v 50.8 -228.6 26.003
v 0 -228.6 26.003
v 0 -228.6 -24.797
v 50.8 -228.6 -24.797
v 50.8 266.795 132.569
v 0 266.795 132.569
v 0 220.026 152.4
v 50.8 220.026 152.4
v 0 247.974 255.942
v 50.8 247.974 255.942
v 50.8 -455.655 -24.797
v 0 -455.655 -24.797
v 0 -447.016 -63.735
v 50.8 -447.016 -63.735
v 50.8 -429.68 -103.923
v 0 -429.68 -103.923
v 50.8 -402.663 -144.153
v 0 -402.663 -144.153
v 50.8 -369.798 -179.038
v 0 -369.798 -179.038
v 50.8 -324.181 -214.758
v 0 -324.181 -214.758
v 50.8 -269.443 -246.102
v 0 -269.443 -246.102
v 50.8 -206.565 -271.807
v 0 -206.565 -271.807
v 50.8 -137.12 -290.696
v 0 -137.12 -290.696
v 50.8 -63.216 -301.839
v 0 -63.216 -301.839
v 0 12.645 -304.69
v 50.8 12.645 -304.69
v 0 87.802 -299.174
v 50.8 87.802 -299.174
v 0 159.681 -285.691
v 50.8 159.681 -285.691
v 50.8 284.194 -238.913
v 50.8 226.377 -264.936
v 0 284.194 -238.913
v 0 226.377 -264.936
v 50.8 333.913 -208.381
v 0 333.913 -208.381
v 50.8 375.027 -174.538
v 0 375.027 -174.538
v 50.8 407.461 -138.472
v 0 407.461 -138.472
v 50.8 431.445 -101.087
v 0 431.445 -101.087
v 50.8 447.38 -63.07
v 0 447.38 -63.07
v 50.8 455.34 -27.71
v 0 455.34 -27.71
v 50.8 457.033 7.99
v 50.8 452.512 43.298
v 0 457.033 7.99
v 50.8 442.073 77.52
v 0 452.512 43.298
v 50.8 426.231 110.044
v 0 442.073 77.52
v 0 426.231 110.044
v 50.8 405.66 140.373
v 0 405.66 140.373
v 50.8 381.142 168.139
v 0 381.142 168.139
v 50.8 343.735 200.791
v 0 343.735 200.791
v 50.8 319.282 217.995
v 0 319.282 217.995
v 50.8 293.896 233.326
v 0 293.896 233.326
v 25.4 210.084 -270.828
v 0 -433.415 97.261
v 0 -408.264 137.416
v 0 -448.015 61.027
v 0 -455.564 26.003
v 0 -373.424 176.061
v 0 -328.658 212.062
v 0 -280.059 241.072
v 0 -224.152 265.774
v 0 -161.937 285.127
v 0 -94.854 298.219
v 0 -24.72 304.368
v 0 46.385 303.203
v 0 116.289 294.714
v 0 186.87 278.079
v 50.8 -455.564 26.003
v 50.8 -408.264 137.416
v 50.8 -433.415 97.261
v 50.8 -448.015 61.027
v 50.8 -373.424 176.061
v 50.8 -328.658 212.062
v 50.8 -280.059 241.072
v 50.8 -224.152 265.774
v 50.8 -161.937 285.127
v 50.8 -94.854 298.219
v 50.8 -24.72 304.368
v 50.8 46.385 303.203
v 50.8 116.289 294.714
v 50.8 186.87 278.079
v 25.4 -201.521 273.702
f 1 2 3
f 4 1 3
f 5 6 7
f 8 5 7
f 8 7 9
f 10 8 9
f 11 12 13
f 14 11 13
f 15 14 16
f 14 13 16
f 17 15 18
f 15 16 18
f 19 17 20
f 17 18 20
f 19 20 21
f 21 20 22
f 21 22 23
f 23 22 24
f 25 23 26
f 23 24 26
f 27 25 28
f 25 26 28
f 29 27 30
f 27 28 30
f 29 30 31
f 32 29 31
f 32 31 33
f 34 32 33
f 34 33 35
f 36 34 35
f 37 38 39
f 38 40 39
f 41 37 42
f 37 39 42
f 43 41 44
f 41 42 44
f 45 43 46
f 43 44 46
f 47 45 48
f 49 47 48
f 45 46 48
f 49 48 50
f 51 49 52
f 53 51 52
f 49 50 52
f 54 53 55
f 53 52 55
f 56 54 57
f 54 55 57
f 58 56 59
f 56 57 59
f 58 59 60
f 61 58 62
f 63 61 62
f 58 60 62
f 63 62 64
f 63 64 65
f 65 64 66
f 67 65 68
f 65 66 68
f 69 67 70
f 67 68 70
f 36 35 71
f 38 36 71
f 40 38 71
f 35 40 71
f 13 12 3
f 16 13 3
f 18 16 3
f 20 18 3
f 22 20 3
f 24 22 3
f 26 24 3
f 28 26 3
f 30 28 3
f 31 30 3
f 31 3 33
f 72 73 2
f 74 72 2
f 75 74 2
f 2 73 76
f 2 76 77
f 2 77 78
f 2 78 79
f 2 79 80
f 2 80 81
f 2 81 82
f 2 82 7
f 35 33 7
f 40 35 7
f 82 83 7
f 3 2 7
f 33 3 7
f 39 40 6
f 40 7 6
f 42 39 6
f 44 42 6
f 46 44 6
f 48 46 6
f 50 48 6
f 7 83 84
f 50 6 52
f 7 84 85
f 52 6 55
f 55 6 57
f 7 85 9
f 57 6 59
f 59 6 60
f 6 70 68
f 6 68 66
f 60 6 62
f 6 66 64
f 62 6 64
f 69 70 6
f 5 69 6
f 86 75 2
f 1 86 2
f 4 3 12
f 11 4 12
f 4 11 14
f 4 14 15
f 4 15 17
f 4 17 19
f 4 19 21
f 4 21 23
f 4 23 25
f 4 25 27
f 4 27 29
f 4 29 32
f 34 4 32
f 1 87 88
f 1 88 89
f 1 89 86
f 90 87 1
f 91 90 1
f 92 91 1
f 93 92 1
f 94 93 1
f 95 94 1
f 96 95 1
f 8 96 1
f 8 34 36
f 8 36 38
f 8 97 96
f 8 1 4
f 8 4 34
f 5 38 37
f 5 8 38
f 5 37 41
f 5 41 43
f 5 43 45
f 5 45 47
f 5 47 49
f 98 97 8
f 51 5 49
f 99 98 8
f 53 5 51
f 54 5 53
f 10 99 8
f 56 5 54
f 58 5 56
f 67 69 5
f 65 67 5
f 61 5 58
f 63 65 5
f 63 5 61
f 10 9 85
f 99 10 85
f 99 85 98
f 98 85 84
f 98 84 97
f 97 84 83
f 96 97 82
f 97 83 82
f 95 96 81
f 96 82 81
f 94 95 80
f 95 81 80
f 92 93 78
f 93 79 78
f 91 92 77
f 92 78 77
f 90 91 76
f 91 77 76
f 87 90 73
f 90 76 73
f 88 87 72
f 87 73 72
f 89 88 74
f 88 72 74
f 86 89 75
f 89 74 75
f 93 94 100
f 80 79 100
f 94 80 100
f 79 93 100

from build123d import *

# Parameters (mm, degrees)
PAD_DEPTH = 50.8


with BuildPart() as part:
    # Sketch → Pad (new body)
    with BuildSketch(Plane.YZ):
        with BuildLine():
            Line((-228.6, -24.796869), (-455.65473, -24.796869))
            add(Edge.make_bspline(
                [(-455.65473, -24.796869), (-399.291548, -480.679242), (210.084192, -270.828372), (819.459932, -60.977501), (293.896464, 233.326256)],
                knots=[0.082882, 0.082882, 0.082882, 2.048869, 2.048869, 4.014856, 4.014856, 4.014856], degree=2, weights=[1, 0.554534, 1, 0.554534, 1]))
            Line((293.896464, 233.326256), (266.795135, 132.569061))
            Line((266.795135, 132.569061), (220.025766, 152.4))
            Line((220.025766, 152.4), (247.97367, 255.941865))
            add(Edge.make_bspline(
                [(247.97367, 255.941865), (-391.258638, 531.398878), (-455.564276, 26.003131)],
                knots=[4.139767, 4.139767, 4.139767, 6.199207, 6.199207, 6.199207], degree=2, weights=[1, 0.515059, 1]))
            Line((-455.564276, 26.003131), (-228.6, 26.003131))
            Line((-228.6, 26.003131), (-228.6, -24.796869))
        make_face()
    extrude(amount=PAD_DEPTH)


solid = part.part
